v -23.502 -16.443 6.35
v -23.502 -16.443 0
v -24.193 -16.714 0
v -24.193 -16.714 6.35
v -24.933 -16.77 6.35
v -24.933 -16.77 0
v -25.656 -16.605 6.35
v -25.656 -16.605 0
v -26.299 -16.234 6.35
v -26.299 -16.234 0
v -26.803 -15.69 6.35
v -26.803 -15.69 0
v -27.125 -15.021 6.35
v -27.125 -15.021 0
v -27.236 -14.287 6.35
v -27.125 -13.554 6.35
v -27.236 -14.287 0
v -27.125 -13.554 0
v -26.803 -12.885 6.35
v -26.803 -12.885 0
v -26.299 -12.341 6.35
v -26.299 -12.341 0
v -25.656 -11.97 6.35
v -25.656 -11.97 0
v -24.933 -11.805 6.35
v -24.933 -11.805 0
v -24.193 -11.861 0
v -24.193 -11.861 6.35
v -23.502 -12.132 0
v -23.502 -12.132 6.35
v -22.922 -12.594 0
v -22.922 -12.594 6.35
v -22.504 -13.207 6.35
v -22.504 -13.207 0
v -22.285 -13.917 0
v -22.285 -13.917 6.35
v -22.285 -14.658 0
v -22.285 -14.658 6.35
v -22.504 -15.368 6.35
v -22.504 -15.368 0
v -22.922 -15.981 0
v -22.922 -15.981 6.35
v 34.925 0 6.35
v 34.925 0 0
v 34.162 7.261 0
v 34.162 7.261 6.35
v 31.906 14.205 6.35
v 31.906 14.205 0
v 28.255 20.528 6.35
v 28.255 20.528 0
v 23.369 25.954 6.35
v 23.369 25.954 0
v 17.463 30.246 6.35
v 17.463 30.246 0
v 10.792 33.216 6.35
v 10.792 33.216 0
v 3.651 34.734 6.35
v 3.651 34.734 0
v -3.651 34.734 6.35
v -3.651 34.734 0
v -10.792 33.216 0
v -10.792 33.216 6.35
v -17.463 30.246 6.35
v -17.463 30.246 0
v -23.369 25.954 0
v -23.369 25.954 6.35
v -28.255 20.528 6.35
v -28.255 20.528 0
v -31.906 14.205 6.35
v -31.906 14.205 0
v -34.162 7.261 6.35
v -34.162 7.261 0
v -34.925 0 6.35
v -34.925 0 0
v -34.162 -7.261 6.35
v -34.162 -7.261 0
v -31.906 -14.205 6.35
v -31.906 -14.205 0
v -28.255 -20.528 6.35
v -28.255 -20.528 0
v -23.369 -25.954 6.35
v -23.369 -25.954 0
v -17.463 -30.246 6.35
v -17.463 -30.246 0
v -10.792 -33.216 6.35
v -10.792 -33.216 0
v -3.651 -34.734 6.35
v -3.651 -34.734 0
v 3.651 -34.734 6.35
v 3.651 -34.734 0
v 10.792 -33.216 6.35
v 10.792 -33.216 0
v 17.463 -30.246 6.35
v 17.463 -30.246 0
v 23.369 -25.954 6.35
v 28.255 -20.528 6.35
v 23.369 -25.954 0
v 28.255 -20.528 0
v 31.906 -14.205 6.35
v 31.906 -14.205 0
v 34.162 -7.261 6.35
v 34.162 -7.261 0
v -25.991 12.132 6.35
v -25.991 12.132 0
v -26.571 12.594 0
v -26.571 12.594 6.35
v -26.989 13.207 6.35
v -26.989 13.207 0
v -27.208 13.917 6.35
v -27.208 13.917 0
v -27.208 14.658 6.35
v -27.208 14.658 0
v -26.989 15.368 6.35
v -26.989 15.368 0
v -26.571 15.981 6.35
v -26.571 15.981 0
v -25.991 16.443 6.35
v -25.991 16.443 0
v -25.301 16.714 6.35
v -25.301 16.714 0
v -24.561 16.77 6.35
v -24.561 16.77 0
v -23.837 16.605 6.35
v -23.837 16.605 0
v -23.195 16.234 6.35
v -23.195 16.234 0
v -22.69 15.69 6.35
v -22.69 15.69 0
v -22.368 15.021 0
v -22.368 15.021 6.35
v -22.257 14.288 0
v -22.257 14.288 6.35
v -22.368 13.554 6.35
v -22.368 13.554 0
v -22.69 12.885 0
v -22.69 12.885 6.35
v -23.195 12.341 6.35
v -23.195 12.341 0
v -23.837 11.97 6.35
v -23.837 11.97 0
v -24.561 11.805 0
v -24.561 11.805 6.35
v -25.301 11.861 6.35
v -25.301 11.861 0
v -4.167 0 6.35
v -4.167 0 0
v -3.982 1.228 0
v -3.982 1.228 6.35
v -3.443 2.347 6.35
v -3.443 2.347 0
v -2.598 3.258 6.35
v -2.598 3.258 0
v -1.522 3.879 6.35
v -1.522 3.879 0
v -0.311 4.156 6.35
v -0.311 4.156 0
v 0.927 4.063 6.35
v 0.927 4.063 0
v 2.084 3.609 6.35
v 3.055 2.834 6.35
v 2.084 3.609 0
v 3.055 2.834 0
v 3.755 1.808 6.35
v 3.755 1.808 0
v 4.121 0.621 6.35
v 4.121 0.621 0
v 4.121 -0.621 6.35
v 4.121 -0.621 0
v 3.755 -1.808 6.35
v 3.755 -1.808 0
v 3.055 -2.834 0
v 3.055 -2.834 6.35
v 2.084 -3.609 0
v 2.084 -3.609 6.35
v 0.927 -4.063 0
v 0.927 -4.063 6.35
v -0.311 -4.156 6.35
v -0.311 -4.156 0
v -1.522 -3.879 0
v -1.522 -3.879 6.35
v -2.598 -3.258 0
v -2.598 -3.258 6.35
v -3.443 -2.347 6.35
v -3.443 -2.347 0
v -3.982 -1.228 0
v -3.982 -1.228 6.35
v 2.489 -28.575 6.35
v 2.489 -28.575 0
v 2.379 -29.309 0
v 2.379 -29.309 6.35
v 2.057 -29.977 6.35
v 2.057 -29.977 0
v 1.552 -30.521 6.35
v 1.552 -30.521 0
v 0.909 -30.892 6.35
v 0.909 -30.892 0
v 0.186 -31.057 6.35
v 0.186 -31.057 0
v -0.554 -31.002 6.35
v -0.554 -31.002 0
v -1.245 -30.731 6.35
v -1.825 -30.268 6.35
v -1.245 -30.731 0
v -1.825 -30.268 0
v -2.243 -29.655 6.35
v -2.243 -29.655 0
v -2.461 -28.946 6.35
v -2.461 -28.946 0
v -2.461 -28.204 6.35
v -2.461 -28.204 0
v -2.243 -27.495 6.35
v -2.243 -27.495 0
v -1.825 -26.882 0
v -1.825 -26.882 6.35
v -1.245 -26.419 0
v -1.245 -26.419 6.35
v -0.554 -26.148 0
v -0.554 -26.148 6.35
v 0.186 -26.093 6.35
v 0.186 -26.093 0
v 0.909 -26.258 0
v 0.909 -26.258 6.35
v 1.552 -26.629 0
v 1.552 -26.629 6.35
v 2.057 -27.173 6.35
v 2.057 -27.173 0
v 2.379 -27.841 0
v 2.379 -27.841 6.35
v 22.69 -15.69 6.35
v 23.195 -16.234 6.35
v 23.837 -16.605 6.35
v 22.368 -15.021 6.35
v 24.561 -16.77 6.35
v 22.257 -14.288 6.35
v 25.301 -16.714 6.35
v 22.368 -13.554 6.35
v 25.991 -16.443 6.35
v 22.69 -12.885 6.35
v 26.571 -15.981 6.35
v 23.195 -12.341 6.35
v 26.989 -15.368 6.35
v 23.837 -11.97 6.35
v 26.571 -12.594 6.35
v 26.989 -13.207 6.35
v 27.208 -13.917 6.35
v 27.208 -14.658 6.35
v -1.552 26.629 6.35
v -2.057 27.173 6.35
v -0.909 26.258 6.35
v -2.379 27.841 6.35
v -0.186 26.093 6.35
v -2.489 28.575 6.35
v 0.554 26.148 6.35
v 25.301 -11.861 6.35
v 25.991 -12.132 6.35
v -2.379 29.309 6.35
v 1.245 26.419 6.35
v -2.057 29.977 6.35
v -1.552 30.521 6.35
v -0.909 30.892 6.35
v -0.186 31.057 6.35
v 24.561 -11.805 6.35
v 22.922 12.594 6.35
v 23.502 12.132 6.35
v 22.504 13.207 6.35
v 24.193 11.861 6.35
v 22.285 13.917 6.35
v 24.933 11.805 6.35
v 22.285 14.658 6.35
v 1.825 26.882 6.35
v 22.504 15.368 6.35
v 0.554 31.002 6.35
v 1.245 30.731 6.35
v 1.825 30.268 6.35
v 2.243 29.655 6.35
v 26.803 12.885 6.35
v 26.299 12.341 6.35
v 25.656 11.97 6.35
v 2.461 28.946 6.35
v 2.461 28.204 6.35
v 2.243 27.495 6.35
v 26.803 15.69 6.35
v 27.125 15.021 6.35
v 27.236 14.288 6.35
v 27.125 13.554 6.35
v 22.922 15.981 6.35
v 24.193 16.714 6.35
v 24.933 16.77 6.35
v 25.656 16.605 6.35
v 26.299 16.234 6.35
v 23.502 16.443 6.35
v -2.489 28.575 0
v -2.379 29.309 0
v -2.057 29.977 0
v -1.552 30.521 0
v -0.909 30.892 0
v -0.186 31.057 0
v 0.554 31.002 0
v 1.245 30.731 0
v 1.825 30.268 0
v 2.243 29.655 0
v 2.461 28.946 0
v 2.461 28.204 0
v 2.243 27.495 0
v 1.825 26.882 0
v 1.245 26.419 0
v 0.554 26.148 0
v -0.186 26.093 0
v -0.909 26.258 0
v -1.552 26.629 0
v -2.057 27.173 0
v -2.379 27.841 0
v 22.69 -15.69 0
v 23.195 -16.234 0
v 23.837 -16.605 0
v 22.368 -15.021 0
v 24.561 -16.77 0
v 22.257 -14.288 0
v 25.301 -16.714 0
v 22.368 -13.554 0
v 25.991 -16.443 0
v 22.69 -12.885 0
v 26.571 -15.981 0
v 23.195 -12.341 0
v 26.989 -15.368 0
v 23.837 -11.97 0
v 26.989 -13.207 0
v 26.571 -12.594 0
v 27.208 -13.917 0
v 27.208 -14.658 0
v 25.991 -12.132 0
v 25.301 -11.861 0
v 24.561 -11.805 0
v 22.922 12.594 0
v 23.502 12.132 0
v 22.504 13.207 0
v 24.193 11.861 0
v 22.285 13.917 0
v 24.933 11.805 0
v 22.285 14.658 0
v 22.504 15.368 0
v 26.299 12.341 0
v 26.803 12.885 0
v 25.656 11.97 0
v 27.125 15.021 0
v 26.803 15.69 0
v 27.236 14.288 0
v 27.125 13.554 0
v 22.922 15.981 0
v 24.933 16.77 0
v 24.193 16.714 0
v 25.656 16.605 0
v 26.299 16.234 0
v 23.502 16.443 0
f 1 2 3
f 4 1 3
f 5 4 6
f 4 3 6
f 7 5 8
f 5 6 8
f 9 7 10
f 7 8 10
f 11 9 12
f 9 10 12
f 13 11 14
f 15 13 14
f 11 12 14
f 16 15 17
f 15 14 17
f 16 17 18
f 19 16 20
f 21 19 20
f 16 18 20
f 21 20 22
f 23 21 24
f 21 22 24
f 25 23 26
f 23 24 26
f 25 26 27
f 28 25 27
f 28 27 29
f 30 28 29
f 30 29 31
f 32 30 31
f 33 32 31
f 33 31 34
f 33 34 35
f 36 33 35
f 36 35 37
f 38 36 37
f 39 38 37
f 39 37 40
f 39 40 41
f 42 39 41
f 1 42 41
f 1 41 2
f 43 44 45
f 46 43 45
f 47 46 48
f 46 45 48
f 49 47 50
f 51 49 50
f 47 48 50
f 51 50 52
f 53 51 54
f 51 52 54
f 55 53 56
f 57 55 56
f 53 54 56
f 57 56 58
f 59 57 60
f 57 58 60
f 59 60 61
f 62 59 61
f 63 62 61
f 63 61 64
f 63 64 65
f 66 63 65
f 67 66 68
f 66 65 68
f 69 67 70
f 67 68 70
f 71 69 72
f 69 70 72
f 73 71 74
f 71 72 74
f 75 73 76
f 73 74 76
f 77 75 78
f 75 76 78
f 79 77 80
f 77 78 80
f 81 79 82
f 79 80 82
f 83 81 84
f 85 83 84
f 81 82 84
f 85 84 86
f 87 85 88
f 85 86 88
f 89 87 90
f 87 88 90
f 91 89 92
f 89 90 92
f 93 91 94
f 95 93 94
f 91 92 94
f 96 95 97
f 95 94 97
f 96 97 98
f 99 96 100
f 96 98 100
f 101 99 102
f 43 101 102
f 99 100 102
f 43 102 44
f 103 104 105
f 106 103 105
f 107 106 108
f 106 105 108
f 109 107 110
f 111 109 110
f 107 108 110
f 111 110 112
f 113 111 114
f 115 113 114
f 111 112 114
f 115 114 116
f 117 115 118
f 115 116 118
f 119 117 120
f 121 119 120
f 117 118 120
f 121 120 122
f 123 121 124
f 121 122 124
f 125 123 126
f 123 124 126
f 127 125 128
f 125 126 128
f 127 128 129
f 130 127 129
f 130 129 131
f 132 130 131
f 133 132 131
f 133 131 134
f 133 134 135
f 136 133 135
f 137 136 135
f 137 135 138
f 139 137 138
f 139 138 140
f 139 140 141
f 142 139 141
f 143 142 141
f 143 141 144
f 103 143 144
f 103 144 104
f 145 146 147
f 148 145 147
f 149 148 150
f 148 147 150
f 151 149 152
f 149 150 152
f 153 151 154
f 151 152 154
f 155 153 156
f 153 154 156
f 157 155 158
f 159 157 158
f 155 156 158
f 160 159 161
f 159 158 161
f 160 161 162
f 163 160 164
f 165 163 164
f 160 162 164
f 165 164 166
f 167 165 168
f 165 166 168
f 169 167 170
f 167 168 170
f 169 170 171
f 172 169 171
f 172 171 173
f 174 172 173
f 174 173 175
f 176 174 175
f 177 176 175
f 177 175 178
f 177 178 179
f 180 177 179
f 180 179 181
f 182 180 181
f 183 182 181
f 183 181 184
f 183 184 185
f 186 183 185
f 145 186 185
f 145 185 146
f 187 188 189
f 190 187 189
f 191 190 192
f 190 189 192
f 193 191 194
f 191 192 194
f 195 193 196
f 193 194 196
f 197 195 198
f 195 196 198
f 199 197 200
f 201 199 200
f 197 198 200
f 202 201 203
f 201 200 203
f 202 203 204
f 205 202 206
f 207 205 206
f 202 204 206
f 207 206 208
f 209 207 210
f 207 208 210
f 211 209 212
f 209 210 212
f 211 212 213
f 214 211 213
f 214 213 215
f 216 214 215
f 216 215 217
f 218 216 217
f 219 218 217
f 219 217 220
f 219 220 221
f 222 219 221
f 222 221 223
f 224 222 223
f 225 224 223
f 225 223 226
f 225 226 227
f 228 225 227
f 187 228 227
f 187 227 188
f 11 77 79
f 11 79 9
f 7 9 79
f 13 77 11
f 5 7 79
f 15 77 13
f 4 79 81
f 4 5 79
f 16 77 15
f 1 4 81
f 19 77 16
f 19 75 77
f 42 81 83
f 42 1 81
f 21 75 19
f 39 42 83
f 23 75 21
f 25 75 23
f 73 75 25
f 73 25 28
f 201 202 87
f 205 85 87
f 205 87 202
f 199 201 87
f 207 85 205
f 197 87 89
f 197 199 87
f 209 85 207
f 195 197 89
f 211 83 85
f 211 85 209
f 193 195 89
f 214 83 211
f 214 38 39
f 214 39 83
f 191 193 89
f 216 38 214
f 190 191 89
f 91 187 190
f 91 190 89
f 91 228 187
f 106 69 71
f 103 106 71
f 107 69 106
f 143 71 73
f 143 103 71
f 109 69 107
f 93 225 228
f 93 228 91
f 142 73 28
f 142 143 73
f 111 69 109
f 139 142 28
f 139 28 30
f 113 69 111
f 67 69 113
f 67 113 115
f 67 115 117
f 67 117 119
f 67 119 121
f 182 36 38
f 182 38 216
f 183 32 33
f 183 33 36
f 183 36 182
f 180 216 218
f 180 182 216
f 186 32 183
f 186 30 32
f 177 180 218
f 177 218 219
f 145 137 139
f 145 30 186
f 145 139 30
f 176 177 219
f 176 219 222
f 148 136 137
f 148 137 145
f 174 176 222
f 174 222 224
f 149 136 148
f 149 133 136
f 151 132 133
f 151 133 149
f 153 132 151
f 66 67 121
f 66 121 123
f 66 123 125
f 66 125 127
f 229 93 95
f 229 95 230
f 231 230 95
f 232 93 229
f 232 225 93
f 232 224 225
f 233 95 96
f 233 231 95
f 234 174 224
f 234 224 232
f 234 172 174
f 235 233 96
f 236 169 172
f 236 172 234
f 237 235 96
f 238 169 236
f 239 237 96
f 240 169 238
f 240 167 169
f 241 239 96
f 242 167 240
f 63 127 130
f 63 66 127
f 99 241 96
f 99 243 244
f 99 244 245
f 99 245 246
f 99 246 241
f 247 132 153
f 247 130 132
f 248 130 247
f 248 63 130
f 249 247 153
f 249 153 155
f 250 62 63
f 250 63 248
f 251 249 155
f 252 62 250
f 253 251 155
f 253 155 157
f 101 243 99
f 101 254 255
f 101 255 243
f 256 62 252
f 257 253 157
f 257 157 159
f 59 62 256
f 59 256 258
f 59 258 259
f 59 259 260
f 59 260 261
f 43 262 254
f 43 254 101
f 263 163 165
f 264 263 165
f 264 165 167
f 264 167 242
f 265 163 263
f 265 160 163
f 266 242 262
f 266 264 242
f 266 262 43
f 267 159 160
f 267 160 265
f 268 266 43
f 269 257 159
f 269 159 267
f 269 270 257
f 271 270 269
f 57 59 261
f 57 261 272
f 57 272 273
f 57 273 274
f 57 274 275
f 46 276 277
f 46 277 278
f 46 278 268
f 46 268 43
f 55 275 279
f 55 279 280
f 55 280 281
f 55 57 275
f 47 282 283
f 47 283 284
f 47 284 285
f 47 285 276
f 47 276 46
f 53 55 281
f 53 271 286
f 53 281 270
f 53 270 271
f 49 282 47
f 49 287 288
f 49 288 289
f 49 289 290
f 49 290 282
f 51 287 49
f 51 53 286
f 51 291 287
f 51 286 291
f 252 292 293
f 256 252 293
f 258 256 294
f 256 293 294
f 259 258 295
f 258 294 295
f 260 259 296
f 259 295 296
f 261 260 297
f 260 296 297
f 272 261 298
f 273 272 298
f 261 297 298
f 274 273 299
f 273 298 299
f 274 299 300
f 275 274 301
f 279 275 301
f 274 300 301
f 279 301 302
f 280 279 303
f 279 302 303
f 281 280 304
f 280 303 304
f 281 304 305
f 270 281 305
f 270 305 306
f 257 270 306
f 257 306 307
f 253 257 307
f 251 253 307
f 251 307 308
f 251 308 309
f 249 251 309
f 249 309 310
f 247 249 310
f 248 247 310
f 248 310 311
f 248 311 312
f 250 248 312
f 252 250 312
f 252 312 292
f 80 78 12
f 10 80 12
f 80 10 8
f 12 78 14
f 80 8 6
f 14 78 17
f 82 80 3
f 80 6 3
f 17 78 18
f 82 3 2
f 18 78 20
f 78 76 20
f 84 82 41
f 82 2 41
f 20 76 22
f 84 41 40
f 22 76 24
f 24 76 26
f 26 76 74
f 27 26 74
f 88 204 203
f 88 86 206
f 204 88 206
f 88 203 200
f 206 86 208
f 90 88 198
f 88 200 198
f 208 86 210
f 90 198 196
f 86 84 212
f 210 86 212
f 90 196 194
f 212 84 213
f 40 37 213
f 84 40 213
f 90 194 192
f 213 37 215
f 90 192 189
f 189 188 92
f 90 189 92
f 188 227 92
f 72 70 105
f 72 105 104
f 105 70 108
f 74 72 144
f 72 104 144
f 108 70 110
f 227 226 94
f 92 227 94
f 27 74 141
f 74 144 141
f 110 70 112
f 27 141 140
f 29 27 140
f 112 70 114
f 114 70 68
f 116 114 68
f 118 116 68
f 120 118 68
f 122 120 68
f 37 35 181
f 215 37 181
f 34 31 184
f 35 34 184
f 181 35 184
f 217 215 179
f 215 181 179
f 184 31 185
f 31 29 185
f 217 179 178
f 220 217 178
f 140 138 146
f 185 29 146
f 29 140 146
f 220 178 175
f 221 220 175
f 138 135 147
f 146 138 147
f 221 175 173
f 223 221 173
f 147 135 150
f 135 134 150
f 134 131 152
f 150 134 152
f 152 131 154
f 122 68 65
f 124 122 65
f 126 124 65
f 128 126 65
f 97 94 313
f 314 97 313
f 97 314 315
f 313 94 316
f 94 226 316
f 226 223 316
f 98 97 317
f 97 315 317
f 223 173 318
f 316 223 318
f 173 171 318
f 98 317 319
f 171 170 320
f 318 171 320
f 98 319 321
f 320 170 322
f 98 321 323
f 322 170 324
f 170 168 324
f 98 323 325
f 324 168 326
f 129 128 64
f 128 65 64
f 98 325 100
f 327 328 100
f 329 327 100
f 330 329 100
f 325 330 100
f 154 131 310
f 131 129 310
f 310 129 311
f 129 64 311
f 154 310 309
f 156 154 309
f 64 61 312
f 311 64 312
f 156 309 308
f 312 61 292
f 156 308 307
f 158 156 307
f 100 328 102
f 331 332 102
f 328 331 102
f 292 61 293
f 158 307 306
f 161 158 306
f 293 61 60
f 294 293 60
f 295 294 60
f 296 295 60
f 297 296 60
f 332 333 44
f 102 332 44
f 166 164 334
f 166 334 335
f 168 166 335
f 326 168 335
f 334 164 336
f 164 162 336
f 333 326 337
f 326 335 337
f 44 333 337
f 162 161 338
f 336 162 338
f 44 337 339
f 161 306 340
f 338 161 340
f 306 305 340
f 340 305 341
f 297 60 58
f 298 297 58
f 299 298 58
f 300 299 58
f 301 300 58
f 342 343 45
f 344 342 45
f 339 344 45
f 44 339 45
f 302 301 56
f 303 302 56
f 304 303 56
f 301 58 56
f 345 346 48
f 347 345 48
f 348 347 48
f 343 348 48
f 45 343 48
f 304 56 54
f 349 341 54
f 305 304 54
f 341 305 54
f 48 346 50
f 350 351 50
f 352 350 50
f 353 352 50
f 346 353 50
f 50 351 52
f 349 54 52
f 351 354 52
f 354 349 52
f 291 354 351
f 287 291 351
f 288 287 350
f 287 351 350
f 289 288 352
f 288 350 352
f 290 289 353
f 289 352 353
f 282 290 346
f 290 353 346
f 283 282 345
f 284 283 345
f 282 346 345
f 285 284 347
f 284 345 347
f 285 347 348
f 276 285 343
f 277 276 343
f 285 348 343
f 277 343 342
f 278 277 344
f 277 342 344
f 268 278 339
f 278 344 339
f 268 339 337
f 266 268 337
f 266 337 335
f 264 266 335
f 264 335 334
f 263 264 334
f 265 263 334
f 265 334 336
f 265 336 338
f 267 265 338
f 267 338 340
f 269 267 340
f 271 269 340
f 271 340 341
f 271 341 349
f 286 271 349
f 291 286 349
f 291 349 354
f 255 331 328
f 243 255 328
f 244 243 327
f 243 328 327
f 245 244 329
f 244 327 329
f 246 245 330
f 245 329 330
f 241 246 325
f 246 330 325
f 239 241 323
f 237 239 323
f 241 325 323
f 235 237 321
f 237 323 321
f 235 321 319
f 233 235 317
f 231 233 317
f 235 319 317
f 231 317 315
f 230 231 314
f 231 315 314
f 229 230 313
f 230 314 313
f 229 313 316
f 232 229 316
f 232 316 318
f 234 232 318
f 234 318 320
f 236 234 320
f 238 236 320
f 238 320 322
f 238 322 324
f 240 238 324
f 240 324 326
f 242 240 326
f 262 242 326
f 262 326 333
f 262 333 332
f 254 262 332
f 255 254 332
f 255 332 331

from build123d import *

# Parameters (mm, degrees)
F0_R            = 34.925
F1_DEPTH        = 6.35
F3_D            = 4.9784
F3_COPIES_COUNT = 6
F5_D            = 8.334375


# Not quite as in the source:
# - a pattern or mirror of a feature is missing from the dataset's text; its kind, count and spacing are read off the source's solid


with BuildPart() as f1:
    # F0 (on Top) → F1 (new body)
    with BuildSketch(Plane.XY):
        Circle(F0_R)
    extrude(amount=F1_DEPTH)

    # F3 (through all)
    with Locations(Plane.XY.offset(6.35)):
        with Locations((0, 28.575)):
            f3 = Hole(F3_D / 2)

    # F3_copies: F3 ×6 about axis
    f3_copies_axis = Axis((0, 0, 0), (0, 0, 1))
    for i in range(1, F3_COPIES_COUNT):
        add(f3.rotate(f3_copies_axis, i * 360 / F3_COPIES_COUNT), mode=Mode.SUBTRACT)

    # F5 (through all)
    with Locations(Plane.XY.offset(6.35)):
        with Locations((0, 0)):
            Hole(F5_D / 2)


solid = f1.part
